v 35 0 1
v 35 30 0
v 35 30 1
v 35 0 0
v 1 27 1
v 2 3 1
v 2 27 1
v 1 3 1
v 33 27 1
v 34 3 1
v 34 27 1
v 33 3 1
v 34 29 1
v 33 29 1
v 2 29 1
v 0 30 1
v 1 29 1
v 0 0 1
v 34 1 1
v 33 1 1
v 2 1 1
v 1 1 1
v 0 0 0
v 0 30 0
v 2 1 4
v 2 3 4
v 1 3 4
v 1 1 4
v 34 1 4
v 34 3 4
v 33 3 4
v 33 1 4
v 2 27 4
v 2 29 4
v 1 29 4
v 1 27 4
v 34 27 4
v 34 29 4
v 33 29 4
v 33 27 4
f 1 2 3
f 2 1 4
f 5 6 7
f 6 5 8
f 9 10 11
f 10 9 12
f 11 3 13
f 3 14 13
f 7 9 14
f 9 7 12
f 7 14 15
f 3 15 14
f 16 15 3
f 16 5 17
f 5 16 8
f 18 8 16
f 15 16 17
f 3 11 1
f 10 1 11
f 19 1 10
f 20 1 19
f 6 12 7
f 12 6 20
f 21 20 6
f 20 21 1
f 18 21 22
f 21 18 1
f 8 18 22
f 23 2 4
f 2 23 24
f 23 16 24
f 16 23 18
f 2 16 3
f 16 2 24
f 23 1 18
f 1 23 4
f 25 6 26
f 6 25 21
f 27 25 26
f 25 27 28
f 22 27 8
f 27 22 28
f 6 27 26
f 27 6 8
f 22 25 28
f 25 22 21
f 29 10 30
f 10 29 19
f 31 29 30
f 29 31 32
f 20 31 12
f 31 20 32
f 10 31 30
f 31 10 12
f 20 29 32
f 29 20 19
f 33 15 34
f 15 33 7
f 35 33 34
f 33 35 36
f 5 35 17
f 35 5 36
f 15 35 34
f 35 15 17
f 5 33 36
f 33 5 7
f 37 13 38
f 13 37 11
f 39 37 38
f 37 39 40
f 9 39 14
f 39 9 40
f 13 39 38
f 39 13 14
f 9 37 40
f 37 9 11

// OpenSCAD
thickness = 1;
phone_hole_diameter = 5.2;
cable_diameter = 3.4;

lx = 35;
ly = 30;
lz = thickness + phone_hole_diameter * 2;

switch_lx = 6.4;
switch_ly = 14;
switch_lz = 7.8;
swicth_border_ly = 4;

module box() {

	difference() {
		cube([lx, ly, lz]);

		translate([thickness, thickness, thickness])
		cube([lx - thickness * 2, ly - thickness * 2, lz]);

		translate([phone_hole_diameter + thickness, -1, phone_hole_diameter + thickness])
		rotate([270, 0, 0])
		cylinder(r = phone_hole_diameter / 2, h = thickness + 2);

		translate([lx - phone_hole_diameter - thickness, -1, phone_hole_diameter + thickness])
		rotate([270, 0, 0])
		cylinder(r = phone_hole_diameter / 2, h = thickness + 2);

		translate([lx / 2, -1, phone_hole_diameter + thickness])
		rotate([270, 0, 0])
		cylinder(r = cable_diameter / 2, h = thickness + 2);

		translate([lx / 2, ly - thickness / 2, thickness + switch_lz / 2])
		cube([switch_lx, thickness + 2, switch_lz], center = true);
	}

	translate([lx / 2 + switch_lx / 2 + 2, ly - thickness * 2 - swicth_border_ly, thickness])
	cube([12.3, thickness, switch_lz / 4]);

	translate([lx / 2, ly - switch_ly / 2 - thickness, thickness + switch_lz / 2])
	% cube([switch_lx, switch_ly, switch_lz], center = true);
}

module cap() {
	cube([lx, ly, thickness]);

	translate([thickness, thickness, thickness])
	cube([thickness, thickness * 2, thickness * 3]);

	translate([lx - thickness * 2, thickness, thickness])
	cube([thickness, thickness * 2, thickness * 3]);

	translate([thickness, ly - thickness * 3, thickness])
	cube([thickness, thickness * 2, thickness * 3]);

	translate([lx - thickness * 2, ly - thickness * 3, thickness])
	cube([thickness, thickness * 2, thickness * 3]);
}

cap();
//box();
